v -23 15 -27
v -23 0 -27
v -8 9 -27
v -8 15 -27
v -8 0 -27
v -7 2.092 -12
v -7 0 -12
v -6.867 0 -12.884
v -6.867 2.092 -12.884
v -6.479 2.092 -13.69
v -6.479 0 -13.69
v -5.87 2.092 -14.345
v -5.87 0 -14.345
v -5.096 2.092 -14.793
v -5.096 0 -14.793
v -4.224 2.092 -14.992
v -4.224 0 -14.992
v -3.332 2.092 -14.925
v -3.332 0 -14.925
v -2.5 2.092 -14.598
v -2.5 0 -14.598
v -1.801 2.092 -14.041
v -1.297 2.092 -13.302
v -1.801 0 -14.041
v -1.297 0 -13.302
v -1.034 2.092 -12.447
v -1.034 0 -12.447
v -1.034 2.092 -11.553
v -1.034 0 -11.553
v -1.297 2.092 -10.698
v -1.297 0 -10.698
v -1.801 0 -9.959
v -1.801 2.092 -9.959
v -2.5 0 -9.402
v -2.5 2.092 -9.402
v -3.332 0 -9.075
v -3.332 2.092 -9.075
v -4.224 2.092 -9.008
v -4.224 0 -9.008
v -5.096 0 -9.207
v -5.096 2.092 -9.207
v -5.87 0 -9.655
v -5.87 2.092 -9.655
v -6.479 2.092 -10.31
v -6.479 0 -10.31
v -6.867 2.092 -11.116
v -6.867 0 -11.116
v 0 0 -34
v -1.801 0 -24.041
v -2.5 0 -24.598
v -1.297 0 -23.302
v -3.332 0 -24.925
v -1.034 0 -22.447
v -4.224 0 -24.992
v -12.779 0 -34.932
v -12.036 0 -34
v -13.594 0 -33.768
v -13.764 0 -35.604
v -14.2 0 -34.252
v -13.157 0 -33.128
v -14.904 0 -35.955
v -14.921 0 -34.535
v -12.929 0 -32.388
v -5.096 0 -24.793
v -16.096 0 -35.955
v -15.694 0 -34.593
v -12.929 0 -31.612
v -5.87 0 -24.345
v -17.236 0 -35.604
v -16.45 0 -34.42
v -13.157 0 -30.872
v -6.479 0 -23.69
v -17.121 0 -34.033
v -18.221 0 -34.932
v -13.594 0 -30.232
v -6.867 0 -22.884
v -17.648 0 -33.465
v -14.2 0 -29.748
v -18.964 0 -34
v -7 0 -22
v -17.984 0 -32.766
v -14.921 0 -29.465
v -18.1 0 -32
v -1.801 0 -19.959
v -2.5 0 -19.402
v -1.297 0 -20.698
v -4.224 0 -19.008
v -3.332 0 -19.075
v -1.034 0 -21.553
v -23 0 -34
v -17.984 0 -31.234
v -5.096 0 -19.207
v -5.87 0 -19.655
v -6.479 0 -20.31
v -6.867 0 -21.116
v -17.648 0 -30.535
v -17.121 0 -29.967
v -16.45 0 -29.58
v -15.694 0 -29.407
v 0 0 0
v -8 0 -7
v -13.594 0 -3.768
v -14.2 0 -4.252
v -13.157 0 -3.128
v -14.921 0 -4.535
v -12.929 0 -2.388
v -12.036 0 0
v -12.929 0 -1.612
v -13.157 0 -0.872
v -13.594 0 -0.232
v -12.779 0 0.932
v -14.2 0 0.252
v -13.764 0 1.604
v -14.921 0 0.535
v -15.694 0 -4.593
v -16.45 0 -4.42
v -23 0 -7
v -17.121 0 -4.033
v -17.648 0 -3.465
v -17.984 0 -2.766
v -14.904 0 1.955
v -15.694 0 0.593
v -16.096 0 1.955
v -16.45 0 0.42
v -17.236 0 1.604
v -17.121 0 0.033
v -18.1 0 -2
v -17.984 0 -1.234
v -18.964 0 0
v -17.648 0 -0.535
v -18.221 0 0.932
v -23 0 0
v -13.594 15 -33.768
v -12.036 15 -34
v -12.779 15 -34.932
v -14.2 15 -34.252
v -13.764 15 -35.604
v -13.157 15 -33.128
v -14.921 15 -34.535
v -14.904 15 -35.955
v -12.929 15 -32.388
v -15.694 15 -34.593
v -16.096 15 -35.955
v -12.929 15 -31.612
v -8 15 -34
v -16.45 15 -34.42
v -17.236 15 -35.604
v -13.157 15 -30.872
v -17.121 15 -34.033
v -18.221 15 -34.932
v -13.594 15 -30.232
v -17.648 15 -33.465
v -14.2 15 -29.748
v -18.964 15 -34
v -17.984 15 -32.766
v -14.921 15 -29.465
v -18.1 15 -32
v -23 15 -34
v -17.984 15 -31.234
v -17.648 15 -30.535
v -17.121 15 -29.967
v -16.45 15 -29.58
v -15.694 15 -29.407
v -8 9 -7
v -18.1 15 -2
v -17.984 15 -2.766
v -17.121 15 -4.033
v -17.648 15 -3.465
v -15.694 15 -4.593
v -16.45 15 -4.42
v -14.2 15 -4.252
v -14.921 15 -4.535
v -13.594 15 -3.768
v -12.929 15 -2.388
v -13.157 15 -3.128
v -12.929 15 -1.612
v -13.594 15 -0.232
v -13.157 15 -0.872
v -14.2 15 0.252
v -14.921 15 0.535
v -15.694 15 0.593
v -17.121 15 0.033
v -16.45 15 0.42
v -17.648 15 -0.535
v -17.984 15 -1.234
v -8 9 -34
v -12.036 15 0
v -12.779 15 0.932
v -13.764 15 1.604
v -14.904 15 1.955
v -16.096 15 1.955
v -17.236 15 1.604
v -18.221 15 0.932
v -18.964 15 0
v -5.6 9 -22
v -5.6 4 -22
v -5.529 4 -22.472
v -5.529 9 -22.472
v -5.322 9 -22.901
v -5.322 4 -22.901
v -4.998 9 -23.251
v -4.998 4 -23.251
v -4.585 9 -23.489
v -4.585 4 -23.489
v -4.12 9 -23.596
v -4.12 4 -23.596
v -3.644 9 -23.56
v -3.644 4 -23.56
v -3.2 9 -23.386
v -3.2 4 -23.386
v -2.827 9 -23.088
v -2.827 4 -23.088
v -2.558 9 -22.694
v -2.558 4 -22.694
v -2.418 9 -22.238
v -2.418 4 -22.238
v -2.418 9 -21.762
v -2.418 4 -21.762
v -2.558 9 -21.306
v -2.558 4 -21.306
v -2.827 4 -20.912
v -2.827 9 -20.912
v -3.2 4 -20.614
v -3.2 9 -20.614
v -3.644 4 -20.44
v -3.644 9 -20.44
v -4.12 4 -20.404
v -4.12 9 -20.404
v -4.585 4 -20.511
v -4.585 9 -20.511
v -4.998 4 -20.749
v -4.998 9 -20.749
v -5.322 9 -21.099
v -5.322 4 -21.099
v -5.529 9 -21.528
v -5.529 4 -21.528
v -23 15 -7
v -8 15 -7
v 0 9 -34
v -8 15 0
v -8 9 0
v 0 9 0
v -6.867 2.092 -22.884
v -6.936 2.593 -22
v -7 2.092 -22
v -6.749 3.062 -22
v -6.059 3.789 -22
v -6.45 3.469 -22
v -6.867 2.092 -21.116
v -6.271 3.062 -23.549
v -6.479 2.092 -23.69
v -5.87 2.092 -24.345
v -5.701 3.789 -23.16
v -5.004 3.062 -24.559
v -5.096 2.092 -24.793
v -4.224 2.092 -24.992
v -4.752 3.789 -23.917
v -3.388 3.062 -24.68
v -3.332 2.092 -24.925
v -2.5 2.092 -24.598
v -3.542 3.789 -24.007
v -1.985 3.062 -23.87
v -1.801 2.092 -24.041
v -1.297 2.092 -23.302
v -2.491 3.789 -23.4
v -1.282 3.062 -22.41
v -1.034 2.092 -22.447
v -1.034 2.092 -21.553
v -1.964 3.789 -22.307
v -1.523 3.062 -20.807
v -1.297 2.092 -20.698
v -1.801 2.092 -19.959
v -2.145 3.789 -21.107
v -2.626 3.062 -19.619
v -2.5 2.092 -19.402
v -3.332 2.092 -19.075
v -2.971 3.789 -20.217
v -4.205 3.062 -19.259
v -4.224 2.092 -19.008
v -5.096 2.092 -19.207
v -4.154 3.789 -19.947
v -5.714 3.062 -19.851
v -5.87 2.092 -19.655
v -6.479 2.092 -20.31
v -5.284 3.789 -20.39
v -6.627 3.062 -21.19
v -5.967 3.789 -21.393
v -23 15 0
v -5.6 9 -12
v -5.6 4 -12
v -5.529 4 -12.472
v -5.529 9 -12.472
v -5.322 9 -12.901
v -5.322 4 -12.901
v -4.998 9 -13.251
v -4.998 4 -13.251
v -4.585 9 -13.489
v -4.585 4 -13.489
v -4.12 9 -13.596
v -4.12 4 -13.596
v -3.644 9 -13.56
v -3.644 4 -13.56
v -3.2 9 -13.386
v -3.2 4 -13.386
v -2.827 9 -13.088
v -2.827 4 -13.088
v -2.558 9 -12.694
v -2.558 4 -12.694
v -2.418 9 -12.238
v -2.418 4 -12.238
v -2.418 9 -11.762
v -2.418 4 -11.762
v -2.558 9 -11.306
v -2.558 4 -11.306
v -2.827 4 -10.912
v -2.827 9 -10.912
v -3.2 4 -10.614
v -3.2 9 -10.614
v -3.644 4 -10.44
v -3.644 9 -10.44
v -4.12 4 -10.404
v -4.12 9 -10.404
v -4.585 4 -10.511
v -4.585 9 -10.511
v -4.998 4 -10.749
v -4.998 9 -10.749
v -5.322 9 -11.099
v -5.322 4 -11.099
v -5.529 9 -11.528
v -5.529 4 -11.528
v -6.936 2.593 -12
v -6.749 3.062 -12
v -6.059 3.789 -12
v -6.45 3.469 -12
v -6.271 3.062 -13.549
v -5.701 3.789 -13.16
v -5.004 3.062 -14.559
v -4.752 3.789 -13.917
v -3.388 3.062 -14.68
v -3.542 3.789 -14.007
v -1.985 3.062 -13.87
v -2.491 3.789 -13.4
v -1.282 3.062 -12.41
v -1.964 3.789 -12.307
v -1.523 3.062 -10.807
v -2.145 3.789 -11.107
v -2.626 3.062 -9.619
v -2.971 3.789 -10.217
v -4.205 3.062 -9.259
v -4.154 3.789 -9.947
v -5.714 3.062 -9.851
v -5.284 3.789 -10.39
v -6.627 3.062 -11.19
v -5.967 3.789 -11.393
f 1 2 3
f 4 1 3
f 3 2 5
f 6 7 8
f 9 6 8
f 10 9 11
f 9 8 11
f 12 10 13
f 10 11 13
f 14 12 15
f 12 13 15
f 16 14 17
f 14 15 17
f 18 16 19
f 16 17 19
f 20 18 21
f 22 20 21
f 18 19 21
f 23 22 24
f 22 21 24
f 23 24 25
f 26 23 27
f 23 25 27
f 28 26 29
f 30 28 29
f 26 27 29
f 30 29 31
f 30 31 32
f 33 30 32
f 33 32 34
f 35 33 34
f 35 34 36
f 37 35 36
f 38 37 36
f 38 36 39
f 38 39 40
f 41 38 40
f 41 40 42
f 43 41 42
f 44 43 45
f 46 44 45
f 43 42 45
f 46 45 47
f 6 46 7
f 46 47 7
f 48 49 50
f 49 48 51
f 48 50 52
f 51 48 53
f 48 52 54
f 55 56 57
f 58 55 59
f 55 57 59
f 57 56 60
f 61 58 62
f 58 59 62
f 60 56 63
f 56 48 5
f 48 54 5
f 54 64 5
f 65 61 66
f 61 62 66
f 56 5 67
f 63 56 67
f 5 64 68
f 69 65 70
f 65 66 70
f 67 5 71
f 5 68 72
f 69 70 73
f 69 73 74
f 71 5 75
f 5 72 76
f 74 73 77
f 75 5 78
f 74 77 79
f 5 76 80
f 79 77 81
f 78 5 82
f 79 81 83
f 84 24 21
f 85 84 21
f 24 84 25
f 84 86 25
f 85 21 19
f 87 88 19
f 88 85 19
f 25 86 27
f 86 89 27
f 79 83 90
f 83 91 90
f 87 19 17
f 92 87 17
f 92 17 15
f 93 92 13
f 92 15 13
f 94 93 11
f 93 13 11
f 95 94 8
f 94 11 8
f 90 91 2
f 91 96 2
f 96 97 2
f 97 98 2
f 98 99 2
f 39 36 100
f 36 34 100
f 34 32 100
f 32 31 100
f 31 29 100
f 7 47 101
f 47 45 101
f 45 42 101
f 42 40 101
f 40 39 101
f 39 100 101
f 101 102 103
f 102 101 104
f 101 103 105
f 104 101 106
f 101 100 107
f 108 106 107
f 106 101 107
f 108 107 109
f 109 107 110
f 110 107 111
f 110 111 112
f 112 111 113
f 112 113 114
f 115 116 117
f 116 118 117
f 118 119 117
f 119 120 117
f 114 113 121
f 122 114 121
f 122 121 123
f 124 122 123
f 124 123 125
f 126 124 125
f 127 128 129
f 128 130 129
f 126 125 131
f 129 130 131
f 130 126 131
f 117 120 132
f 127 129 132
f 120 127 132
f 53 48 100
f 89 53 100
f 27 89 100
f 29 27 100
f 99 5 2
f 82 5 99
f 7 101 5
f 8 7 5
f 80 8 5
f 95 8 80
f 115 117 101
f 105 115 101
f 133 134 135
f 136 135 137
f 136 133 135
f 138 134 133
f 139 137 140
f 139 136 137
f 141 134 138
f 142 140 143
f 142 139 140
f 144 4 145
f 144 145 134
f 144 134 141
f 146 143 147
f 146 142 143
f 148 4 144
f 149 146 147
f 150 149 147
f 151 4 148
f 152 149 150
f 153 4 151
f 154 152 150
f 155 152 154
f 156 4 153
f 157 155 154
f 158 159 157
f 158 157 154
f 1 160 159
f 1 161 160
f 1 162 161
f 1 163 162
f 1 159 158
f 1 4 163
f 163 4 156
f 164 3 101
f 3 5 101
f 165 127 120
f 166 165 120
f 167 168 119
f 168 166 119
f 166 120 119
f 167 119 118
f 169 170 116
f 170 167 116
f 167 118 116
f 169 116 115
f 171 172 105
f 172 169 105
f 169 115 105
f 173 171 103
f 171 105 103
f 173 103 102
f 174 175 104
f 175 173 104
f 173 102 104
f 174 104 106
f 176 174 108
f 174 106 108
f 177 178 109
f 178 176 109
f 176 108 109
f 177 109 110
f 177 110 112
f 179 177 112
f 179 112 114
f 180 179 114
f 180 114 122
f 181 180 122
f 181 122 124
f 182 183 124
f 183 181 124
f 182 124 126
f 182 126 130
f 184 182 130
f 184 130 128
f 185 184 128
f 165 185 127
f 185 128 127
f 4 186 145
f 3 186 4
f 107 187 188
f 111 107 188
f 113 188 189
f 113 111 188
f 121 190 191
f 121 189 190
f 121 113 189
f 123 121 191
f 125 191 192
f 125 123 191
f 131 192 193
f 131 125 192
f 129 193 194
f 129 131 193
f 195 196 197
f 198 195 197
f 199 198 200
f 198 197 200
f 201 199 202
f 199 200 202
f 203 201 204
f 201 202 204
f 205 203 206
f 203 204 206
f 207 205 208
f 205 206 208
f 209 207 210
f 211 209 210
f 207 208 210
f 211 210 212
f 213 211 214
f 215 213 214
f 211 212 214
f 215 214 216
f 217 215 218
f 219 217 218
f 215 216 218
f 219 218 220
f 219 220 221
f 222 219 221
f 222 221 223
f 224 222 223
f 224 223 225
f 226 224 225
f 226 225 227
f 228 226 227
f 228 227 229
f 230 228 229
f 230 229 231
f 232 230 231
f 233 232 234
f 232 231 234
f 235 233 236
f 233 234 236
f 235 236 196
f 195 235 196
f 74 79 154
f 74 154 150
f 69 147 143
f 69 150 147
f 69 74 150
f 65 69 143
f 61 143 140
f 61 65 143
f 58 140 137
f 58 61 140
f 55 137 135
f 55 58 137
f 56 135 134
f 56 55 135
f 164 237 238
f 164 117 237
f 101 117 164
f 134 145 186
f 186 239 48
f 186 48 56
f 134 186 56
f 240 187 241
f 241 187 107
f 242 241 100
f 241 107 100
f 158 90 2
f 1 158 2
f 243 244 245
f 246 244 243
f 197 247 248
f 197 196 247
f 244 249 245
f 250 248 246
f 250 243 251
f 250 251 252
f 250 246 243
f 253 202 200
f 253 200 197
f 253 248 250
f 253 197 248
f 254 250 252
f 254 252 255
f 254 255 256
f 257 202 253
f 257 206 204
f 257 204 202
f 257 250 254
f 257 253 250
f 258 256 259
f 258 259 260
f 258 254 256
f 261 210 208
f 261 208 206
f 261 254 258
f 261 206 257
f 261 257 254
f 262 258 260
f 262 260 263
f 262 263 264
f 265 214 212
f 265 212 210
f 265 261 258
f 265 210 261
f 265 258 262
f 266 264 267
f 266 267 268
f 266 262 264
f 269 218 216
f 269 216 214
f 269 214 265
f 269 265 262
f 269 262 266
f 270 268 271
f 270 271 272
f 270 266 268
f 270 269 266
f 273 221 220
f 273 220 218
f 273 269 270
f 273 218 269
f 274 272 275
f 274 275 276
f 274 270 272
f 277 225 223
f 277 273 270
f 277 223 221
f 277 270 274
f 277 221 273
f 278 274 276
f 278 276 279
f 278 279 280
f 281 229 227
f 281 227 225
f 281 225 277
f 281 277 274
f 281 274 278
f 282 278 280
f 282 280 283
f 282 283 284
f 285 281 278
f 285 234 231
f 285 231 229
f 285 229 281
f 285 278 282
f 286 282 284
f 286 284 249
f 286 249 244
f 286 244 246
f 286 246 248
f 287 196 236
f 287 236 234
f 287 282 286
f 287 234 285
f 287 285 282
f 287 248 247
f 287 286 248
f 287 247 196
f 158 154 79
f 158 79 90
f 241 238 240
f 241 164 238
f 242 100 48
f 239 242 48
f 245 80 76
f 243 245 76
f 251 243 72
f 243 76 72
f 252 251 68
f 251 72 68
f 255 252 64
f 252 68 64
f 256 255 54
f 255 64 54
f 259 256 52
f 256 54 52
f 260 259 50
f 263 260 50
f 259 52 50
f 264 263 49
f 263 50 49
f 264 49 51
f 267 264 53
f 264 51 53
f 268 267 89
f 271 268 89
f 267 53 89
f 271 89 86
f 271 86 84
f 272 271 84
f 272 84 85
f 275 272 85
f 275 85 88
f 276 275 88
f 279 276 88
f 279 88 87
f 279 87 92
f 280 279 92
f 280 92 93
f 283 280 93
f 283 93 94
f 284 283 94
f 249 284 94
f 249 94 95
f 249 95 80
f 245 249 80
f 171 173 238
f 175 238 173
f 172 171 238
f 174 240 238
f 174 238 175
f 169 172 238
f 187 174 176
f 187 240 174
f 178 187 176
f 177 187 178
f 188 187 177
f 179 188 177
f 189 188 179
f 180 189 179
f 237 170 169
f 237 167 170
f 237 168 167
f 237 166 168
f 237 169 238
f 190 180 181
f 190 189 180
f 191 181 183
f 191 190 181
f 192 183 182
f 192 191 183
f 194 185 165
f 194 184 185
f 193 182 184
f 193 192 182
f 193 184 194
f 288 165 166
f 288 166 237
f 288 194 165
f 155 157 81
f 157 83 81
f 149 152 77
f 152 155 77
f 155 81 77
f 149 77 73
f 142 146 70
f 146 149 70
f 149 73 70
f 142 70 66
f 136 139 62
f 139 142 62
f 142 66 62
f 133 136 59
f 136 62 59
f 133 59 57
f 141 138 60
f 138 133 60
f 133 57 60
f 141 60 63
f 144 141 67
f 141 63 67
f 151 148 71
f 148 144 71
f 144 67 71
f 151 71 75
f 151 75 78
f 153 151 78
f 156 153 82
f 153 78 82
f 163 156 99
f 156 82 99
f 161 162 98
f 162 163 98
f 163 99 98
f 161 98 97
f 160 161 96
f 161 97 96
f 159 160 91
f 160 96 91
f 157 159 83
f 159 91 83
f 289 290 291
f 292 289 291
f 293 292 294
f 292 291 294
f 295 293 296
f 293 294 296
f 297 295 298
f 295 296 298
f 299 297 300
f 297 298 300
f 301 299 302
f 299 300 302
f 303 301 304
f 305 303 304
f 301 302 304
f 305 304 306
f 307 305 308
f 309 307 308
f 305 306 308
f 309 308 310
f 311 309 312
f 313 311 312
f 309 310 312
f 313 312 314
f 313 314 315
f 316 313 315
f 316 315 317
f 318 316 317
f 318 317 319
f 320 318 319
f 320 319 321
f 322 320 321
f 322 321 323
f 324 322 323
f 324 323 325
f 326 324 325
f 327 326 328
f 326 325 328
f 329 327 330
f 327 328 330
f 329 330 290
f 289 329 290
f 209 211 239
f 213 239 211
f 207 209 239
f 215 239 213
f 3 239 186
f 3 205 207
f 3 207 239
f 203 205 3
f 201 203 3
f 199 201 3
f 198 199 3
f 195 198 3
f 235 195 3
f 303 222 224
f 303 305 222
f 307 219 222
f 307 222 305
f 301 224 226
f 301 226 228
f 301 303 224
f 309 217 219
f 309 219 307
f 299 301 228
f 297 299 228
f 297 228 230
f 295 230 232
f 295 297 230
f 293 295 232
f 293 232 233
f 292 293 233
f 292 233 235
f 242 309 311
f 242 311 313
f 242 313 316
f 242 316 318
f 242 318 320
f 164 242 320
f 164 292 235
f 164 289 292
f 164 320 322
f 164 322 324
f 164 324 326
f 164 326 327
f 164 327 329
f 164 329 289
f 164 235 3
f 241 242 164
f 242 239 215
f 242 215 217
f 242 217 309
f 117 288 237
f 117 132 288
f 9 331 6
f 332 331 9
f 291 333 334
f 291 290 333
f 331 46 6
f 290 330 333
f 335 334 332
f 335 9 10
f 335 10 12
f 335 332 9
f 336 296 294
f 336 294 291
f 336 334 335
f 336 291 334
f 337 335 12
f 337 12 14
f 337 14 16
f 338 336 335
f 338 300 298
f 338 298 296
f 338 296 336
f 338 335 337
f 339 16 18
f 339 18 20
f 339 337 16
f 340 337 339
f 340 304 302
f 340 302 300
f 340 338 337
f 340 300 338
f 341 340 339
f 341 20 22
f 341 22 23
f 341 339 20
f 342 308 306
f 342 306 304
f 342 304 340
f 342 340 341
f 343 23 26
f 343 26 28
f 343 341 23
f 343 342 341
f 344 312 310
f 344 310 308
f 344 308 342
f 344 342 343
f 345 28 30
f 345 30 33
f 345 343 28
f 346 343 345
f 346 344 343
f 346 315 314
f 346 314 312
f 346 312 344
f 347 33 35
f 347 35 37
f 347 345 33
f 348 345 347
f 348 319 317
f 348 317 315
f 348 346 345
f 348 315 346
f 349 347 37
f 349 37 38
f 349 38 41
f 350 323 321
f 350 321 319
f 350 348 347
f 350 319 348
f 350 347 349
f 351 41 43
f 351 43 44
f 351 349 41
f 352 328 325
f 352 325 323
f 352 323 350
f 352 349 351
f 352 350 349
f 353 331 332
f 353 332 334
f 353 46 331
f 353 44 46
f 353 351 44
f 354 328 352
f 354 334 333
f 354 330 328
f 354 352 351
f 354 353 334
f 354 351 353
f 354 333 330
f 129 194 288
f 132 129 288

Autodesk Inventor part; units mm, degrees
ref_plane "YZ Plane" through (0, 0, 0) normal (1, 0, 0) x (0, 1, 0)
ref_plane "XZ Plane" through (0, 0, 0) normal (0, 1, 0) x (-1, 0, 0)
ref_plane "XY Plane" through (0, 0, 0) normal (0, 0, 1) x (1, 0, 0)
sketch "Sketch1" plane through (0, 0, 0) normal (0, 1, 0) x (-1, 0, 0)
  line L0 (0, 0) -> (0, -34)
  line L1 (0, -34) -> (8, -34)
  line L2 (8, -34) -> (8, 0)
  line L3 (8, 0) -> (0, 0)
  line L4 (23, -34) -> (23, -27)
  line L5 (23, -27) -> (8, -27)
  line L6 (23, 0) -> (23, -7)
  line L7 (23, -7) -> (8, -7)
  line L8 (8, -7) -> (8, -27)
  line L9 (8, -17) -> (4, -17)
  line L10 (4, -17) -> (4, -22)
  line L11 (4, -17) -> (4, -12)
  circle A0 centre (4, -12) radius 1.6
  circle A1 centre (4, -22) radius 1.6
  line L12 (8, -7) -> (0, -7)
  line L13 (8, -27) -> (0, -27)
  line L14 (23, -7) -> (23, -2)
  circle A2 centre (15.5, -2) radius 2.6
  arc A3 (18.9641, 0) -> (12.0359, 0) centre (15.5, -2) ccw
  line L15 (8, 0) -> (12.0359, 0)
  line L16 (18.9641, 0) -> (23, 0)
  line L17 (23, -27) -> (23, -32)
  circle A4 centre (15.5, -32) radius 2.6
  arc A5 (12.0359, -34) -> (18.9641, -34) centre (15.5, -32) ccw
  line L18 (8, -34) -> (12.0359, -34)
  line L19 (18.9641, -34) -> (23, -34)
  circle A6 centre (4, -12) radius 3
  circle A7 centre (4, -22) radius 3
  dimension "d0" = 34
  dimension "d1" = 8
  dimension "d2" = 15
  dimension "d3" = 7
  dimension "d4" = 15
  dimension "d5" = 7
  dimension "d6" = 4
  dimension "d7" = 5
  dimension "d8" = 5
  dimension "d9" = 3.2
  dimension "d10" = 3.2
  dimension "d11" = 5
  dimension "d12" = 5.2
  dimension "d13" = 8
  dimension "d14" = 5
  dimension "d15" = 5.2
  dimension "d16" = 8
  dimension "d21" = 6
  dimension "d22" = 6
extrude "Extrusion1" add sketch "Sketch1" along normal blind 9 contours L3 L2 L12 L0 | L12 L2 L13 L0 | L13 L2 L1 L0 | A6 | A7
extrude "Extrusion2" add sketch "Sketch1" along normal blind 15 contours L15 A3 L16 L6 L7 L2 | L5 L4 L19 A5 L18 L2
extrude "Extrusion3" cut sketch "Sketch1" along normal blind 4 contours A6 | A7
fillet "Fillet1" radius 2 2 edges at (-1, 4, -22) (-1, 4, -12)
properties part number "servo_holder"
